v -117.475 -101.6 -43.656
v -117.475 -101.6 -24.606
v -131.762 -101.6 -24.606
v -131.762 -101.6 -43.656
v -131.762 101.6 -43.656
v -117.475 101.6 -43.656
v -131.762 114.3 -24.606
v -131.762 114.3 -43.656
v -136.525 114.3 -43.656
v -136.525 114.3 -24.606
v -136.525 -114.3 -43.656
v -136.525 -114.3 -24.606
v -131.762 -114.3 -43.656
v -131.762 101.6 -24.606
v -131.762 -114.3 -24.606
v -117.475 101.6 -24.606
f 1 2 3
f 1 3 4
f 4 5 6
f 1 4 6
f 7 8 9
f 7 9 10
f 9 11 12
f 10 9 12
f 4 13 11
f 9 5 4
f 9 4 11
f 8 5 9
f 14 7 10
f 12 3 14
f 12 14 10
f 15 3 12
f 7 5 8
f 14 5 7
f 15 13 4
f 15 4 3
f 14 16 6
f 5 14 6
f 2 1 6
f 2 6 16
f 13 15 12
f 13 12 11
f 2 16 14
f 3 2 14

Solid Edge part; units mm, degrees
sketch "Sketch1" plane through (-70.6437, 101.6, 0) normal (0, -1, 0) x (1, 0, 0)
  line L0 (-61.1187, -43.6562) -> (-46.8312, -43.6562)
  line L1 (-46.8312, -43.6562) -> (-46.8312, -24.6062)
  line L2 (-46.8312, -24.6062) -> (-61.1187, -24.6062)
  line L3 (-61.1187, -24.6062) -> (-61.1187, -43.6562)
  dimension "D1" = 14.2875
  dimension "D2" = 19.05
extrude "Protrusion1" add sketch "Sketch1" along normal up to vertex (203.2 mm away)
sketch "Sketch2" plane through (-131.7625, 0, -34.1313) normal (-1, 0, 0) x (0, -1, 0)
  line L0 (-114.3, 9.525) -> (114.3, 9.525)
  line L1 (114.3, 9.525) -> (114.3, -9.525)
  line L2 (114.3, -9.525) -> (-114.3, -9.525)
  line L3 (-114.3, -9.525) -> (-114.3, 9.525)
  dimension "D1" = 12.7
  dimension "D2" = 12.7
extrude "Protrusion2" add sketch "Sketch2" along normal blind 4.7625
